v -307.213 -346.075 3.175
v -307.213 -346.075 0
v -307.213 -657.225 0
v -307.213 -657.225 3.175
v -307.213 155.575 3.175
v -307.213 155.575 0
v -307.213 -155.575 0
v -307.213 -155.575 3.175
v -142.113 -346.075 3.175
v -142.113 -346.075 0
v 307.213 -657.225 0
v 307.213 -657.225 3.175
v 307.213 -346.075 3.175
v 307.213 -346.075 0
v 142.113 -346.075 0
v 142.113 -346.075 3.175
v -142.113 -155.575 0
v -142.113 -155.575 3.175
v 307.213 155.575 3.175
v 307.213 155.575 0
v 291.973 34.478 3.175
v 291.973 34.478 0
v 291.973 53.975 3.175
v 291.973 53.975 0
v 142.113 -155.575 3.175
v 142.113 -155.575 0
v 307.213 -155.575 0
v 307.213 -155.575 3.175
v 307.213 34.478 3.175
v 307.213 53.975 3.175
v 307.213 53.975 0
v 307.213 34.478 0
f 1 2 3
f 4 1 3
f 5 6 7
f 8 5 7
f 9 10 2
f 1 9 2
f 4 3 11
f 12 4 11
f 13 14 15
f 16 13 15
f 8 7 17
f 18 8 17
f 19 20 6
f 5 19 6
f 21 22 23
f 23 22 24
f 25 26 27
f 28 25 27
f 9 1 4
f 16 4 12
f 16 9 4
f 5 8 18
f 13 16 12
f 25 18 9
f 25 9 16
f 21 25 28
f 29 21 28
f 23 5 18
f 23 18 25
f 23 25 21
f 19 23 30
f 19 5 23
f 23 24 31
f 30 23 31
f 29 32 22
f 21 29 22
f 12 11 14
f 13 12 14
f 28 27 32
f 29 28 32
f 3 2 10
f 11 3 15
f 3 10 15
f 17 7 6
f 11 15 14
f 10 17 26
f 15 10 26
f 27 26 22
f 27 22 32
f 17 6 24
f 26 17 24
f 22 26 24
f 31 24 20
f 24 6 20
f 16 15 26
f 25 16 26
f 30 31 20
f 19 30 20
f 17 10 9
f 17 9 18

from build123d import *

# Parameters (mm, degrees)
F0_W     = 284.226
F0_H     = 190.5
F1_DEPTH = 3.175


with BuildPart() as f1:
    # F0 (on Top) → F1 (new body)
    with BuildSketch(Plane.XY):
        Polygon((307.213, 53.975), (307.213, 155.575), (-307.213, 155.575), (-307.213, -155.575), (-142.113, -155.575), (142.113, -155.575), (307.213, -155.575), (307.213, 34.47796), (291.973, 34.47796), (291.973, 53.975), align=None)
        with Locations((0, -250.825)):
            Rectangle(F0_W, F0_H)
        Polygon((142.113, -346.075), (-142.113, -346.075), (-307.213, -346.075), (-307.213, -657.225), (307.213, -657.225), (307.213, -346.075), align=None)
    extrude(amount=F1_DEPTH)


solid = f1.part
